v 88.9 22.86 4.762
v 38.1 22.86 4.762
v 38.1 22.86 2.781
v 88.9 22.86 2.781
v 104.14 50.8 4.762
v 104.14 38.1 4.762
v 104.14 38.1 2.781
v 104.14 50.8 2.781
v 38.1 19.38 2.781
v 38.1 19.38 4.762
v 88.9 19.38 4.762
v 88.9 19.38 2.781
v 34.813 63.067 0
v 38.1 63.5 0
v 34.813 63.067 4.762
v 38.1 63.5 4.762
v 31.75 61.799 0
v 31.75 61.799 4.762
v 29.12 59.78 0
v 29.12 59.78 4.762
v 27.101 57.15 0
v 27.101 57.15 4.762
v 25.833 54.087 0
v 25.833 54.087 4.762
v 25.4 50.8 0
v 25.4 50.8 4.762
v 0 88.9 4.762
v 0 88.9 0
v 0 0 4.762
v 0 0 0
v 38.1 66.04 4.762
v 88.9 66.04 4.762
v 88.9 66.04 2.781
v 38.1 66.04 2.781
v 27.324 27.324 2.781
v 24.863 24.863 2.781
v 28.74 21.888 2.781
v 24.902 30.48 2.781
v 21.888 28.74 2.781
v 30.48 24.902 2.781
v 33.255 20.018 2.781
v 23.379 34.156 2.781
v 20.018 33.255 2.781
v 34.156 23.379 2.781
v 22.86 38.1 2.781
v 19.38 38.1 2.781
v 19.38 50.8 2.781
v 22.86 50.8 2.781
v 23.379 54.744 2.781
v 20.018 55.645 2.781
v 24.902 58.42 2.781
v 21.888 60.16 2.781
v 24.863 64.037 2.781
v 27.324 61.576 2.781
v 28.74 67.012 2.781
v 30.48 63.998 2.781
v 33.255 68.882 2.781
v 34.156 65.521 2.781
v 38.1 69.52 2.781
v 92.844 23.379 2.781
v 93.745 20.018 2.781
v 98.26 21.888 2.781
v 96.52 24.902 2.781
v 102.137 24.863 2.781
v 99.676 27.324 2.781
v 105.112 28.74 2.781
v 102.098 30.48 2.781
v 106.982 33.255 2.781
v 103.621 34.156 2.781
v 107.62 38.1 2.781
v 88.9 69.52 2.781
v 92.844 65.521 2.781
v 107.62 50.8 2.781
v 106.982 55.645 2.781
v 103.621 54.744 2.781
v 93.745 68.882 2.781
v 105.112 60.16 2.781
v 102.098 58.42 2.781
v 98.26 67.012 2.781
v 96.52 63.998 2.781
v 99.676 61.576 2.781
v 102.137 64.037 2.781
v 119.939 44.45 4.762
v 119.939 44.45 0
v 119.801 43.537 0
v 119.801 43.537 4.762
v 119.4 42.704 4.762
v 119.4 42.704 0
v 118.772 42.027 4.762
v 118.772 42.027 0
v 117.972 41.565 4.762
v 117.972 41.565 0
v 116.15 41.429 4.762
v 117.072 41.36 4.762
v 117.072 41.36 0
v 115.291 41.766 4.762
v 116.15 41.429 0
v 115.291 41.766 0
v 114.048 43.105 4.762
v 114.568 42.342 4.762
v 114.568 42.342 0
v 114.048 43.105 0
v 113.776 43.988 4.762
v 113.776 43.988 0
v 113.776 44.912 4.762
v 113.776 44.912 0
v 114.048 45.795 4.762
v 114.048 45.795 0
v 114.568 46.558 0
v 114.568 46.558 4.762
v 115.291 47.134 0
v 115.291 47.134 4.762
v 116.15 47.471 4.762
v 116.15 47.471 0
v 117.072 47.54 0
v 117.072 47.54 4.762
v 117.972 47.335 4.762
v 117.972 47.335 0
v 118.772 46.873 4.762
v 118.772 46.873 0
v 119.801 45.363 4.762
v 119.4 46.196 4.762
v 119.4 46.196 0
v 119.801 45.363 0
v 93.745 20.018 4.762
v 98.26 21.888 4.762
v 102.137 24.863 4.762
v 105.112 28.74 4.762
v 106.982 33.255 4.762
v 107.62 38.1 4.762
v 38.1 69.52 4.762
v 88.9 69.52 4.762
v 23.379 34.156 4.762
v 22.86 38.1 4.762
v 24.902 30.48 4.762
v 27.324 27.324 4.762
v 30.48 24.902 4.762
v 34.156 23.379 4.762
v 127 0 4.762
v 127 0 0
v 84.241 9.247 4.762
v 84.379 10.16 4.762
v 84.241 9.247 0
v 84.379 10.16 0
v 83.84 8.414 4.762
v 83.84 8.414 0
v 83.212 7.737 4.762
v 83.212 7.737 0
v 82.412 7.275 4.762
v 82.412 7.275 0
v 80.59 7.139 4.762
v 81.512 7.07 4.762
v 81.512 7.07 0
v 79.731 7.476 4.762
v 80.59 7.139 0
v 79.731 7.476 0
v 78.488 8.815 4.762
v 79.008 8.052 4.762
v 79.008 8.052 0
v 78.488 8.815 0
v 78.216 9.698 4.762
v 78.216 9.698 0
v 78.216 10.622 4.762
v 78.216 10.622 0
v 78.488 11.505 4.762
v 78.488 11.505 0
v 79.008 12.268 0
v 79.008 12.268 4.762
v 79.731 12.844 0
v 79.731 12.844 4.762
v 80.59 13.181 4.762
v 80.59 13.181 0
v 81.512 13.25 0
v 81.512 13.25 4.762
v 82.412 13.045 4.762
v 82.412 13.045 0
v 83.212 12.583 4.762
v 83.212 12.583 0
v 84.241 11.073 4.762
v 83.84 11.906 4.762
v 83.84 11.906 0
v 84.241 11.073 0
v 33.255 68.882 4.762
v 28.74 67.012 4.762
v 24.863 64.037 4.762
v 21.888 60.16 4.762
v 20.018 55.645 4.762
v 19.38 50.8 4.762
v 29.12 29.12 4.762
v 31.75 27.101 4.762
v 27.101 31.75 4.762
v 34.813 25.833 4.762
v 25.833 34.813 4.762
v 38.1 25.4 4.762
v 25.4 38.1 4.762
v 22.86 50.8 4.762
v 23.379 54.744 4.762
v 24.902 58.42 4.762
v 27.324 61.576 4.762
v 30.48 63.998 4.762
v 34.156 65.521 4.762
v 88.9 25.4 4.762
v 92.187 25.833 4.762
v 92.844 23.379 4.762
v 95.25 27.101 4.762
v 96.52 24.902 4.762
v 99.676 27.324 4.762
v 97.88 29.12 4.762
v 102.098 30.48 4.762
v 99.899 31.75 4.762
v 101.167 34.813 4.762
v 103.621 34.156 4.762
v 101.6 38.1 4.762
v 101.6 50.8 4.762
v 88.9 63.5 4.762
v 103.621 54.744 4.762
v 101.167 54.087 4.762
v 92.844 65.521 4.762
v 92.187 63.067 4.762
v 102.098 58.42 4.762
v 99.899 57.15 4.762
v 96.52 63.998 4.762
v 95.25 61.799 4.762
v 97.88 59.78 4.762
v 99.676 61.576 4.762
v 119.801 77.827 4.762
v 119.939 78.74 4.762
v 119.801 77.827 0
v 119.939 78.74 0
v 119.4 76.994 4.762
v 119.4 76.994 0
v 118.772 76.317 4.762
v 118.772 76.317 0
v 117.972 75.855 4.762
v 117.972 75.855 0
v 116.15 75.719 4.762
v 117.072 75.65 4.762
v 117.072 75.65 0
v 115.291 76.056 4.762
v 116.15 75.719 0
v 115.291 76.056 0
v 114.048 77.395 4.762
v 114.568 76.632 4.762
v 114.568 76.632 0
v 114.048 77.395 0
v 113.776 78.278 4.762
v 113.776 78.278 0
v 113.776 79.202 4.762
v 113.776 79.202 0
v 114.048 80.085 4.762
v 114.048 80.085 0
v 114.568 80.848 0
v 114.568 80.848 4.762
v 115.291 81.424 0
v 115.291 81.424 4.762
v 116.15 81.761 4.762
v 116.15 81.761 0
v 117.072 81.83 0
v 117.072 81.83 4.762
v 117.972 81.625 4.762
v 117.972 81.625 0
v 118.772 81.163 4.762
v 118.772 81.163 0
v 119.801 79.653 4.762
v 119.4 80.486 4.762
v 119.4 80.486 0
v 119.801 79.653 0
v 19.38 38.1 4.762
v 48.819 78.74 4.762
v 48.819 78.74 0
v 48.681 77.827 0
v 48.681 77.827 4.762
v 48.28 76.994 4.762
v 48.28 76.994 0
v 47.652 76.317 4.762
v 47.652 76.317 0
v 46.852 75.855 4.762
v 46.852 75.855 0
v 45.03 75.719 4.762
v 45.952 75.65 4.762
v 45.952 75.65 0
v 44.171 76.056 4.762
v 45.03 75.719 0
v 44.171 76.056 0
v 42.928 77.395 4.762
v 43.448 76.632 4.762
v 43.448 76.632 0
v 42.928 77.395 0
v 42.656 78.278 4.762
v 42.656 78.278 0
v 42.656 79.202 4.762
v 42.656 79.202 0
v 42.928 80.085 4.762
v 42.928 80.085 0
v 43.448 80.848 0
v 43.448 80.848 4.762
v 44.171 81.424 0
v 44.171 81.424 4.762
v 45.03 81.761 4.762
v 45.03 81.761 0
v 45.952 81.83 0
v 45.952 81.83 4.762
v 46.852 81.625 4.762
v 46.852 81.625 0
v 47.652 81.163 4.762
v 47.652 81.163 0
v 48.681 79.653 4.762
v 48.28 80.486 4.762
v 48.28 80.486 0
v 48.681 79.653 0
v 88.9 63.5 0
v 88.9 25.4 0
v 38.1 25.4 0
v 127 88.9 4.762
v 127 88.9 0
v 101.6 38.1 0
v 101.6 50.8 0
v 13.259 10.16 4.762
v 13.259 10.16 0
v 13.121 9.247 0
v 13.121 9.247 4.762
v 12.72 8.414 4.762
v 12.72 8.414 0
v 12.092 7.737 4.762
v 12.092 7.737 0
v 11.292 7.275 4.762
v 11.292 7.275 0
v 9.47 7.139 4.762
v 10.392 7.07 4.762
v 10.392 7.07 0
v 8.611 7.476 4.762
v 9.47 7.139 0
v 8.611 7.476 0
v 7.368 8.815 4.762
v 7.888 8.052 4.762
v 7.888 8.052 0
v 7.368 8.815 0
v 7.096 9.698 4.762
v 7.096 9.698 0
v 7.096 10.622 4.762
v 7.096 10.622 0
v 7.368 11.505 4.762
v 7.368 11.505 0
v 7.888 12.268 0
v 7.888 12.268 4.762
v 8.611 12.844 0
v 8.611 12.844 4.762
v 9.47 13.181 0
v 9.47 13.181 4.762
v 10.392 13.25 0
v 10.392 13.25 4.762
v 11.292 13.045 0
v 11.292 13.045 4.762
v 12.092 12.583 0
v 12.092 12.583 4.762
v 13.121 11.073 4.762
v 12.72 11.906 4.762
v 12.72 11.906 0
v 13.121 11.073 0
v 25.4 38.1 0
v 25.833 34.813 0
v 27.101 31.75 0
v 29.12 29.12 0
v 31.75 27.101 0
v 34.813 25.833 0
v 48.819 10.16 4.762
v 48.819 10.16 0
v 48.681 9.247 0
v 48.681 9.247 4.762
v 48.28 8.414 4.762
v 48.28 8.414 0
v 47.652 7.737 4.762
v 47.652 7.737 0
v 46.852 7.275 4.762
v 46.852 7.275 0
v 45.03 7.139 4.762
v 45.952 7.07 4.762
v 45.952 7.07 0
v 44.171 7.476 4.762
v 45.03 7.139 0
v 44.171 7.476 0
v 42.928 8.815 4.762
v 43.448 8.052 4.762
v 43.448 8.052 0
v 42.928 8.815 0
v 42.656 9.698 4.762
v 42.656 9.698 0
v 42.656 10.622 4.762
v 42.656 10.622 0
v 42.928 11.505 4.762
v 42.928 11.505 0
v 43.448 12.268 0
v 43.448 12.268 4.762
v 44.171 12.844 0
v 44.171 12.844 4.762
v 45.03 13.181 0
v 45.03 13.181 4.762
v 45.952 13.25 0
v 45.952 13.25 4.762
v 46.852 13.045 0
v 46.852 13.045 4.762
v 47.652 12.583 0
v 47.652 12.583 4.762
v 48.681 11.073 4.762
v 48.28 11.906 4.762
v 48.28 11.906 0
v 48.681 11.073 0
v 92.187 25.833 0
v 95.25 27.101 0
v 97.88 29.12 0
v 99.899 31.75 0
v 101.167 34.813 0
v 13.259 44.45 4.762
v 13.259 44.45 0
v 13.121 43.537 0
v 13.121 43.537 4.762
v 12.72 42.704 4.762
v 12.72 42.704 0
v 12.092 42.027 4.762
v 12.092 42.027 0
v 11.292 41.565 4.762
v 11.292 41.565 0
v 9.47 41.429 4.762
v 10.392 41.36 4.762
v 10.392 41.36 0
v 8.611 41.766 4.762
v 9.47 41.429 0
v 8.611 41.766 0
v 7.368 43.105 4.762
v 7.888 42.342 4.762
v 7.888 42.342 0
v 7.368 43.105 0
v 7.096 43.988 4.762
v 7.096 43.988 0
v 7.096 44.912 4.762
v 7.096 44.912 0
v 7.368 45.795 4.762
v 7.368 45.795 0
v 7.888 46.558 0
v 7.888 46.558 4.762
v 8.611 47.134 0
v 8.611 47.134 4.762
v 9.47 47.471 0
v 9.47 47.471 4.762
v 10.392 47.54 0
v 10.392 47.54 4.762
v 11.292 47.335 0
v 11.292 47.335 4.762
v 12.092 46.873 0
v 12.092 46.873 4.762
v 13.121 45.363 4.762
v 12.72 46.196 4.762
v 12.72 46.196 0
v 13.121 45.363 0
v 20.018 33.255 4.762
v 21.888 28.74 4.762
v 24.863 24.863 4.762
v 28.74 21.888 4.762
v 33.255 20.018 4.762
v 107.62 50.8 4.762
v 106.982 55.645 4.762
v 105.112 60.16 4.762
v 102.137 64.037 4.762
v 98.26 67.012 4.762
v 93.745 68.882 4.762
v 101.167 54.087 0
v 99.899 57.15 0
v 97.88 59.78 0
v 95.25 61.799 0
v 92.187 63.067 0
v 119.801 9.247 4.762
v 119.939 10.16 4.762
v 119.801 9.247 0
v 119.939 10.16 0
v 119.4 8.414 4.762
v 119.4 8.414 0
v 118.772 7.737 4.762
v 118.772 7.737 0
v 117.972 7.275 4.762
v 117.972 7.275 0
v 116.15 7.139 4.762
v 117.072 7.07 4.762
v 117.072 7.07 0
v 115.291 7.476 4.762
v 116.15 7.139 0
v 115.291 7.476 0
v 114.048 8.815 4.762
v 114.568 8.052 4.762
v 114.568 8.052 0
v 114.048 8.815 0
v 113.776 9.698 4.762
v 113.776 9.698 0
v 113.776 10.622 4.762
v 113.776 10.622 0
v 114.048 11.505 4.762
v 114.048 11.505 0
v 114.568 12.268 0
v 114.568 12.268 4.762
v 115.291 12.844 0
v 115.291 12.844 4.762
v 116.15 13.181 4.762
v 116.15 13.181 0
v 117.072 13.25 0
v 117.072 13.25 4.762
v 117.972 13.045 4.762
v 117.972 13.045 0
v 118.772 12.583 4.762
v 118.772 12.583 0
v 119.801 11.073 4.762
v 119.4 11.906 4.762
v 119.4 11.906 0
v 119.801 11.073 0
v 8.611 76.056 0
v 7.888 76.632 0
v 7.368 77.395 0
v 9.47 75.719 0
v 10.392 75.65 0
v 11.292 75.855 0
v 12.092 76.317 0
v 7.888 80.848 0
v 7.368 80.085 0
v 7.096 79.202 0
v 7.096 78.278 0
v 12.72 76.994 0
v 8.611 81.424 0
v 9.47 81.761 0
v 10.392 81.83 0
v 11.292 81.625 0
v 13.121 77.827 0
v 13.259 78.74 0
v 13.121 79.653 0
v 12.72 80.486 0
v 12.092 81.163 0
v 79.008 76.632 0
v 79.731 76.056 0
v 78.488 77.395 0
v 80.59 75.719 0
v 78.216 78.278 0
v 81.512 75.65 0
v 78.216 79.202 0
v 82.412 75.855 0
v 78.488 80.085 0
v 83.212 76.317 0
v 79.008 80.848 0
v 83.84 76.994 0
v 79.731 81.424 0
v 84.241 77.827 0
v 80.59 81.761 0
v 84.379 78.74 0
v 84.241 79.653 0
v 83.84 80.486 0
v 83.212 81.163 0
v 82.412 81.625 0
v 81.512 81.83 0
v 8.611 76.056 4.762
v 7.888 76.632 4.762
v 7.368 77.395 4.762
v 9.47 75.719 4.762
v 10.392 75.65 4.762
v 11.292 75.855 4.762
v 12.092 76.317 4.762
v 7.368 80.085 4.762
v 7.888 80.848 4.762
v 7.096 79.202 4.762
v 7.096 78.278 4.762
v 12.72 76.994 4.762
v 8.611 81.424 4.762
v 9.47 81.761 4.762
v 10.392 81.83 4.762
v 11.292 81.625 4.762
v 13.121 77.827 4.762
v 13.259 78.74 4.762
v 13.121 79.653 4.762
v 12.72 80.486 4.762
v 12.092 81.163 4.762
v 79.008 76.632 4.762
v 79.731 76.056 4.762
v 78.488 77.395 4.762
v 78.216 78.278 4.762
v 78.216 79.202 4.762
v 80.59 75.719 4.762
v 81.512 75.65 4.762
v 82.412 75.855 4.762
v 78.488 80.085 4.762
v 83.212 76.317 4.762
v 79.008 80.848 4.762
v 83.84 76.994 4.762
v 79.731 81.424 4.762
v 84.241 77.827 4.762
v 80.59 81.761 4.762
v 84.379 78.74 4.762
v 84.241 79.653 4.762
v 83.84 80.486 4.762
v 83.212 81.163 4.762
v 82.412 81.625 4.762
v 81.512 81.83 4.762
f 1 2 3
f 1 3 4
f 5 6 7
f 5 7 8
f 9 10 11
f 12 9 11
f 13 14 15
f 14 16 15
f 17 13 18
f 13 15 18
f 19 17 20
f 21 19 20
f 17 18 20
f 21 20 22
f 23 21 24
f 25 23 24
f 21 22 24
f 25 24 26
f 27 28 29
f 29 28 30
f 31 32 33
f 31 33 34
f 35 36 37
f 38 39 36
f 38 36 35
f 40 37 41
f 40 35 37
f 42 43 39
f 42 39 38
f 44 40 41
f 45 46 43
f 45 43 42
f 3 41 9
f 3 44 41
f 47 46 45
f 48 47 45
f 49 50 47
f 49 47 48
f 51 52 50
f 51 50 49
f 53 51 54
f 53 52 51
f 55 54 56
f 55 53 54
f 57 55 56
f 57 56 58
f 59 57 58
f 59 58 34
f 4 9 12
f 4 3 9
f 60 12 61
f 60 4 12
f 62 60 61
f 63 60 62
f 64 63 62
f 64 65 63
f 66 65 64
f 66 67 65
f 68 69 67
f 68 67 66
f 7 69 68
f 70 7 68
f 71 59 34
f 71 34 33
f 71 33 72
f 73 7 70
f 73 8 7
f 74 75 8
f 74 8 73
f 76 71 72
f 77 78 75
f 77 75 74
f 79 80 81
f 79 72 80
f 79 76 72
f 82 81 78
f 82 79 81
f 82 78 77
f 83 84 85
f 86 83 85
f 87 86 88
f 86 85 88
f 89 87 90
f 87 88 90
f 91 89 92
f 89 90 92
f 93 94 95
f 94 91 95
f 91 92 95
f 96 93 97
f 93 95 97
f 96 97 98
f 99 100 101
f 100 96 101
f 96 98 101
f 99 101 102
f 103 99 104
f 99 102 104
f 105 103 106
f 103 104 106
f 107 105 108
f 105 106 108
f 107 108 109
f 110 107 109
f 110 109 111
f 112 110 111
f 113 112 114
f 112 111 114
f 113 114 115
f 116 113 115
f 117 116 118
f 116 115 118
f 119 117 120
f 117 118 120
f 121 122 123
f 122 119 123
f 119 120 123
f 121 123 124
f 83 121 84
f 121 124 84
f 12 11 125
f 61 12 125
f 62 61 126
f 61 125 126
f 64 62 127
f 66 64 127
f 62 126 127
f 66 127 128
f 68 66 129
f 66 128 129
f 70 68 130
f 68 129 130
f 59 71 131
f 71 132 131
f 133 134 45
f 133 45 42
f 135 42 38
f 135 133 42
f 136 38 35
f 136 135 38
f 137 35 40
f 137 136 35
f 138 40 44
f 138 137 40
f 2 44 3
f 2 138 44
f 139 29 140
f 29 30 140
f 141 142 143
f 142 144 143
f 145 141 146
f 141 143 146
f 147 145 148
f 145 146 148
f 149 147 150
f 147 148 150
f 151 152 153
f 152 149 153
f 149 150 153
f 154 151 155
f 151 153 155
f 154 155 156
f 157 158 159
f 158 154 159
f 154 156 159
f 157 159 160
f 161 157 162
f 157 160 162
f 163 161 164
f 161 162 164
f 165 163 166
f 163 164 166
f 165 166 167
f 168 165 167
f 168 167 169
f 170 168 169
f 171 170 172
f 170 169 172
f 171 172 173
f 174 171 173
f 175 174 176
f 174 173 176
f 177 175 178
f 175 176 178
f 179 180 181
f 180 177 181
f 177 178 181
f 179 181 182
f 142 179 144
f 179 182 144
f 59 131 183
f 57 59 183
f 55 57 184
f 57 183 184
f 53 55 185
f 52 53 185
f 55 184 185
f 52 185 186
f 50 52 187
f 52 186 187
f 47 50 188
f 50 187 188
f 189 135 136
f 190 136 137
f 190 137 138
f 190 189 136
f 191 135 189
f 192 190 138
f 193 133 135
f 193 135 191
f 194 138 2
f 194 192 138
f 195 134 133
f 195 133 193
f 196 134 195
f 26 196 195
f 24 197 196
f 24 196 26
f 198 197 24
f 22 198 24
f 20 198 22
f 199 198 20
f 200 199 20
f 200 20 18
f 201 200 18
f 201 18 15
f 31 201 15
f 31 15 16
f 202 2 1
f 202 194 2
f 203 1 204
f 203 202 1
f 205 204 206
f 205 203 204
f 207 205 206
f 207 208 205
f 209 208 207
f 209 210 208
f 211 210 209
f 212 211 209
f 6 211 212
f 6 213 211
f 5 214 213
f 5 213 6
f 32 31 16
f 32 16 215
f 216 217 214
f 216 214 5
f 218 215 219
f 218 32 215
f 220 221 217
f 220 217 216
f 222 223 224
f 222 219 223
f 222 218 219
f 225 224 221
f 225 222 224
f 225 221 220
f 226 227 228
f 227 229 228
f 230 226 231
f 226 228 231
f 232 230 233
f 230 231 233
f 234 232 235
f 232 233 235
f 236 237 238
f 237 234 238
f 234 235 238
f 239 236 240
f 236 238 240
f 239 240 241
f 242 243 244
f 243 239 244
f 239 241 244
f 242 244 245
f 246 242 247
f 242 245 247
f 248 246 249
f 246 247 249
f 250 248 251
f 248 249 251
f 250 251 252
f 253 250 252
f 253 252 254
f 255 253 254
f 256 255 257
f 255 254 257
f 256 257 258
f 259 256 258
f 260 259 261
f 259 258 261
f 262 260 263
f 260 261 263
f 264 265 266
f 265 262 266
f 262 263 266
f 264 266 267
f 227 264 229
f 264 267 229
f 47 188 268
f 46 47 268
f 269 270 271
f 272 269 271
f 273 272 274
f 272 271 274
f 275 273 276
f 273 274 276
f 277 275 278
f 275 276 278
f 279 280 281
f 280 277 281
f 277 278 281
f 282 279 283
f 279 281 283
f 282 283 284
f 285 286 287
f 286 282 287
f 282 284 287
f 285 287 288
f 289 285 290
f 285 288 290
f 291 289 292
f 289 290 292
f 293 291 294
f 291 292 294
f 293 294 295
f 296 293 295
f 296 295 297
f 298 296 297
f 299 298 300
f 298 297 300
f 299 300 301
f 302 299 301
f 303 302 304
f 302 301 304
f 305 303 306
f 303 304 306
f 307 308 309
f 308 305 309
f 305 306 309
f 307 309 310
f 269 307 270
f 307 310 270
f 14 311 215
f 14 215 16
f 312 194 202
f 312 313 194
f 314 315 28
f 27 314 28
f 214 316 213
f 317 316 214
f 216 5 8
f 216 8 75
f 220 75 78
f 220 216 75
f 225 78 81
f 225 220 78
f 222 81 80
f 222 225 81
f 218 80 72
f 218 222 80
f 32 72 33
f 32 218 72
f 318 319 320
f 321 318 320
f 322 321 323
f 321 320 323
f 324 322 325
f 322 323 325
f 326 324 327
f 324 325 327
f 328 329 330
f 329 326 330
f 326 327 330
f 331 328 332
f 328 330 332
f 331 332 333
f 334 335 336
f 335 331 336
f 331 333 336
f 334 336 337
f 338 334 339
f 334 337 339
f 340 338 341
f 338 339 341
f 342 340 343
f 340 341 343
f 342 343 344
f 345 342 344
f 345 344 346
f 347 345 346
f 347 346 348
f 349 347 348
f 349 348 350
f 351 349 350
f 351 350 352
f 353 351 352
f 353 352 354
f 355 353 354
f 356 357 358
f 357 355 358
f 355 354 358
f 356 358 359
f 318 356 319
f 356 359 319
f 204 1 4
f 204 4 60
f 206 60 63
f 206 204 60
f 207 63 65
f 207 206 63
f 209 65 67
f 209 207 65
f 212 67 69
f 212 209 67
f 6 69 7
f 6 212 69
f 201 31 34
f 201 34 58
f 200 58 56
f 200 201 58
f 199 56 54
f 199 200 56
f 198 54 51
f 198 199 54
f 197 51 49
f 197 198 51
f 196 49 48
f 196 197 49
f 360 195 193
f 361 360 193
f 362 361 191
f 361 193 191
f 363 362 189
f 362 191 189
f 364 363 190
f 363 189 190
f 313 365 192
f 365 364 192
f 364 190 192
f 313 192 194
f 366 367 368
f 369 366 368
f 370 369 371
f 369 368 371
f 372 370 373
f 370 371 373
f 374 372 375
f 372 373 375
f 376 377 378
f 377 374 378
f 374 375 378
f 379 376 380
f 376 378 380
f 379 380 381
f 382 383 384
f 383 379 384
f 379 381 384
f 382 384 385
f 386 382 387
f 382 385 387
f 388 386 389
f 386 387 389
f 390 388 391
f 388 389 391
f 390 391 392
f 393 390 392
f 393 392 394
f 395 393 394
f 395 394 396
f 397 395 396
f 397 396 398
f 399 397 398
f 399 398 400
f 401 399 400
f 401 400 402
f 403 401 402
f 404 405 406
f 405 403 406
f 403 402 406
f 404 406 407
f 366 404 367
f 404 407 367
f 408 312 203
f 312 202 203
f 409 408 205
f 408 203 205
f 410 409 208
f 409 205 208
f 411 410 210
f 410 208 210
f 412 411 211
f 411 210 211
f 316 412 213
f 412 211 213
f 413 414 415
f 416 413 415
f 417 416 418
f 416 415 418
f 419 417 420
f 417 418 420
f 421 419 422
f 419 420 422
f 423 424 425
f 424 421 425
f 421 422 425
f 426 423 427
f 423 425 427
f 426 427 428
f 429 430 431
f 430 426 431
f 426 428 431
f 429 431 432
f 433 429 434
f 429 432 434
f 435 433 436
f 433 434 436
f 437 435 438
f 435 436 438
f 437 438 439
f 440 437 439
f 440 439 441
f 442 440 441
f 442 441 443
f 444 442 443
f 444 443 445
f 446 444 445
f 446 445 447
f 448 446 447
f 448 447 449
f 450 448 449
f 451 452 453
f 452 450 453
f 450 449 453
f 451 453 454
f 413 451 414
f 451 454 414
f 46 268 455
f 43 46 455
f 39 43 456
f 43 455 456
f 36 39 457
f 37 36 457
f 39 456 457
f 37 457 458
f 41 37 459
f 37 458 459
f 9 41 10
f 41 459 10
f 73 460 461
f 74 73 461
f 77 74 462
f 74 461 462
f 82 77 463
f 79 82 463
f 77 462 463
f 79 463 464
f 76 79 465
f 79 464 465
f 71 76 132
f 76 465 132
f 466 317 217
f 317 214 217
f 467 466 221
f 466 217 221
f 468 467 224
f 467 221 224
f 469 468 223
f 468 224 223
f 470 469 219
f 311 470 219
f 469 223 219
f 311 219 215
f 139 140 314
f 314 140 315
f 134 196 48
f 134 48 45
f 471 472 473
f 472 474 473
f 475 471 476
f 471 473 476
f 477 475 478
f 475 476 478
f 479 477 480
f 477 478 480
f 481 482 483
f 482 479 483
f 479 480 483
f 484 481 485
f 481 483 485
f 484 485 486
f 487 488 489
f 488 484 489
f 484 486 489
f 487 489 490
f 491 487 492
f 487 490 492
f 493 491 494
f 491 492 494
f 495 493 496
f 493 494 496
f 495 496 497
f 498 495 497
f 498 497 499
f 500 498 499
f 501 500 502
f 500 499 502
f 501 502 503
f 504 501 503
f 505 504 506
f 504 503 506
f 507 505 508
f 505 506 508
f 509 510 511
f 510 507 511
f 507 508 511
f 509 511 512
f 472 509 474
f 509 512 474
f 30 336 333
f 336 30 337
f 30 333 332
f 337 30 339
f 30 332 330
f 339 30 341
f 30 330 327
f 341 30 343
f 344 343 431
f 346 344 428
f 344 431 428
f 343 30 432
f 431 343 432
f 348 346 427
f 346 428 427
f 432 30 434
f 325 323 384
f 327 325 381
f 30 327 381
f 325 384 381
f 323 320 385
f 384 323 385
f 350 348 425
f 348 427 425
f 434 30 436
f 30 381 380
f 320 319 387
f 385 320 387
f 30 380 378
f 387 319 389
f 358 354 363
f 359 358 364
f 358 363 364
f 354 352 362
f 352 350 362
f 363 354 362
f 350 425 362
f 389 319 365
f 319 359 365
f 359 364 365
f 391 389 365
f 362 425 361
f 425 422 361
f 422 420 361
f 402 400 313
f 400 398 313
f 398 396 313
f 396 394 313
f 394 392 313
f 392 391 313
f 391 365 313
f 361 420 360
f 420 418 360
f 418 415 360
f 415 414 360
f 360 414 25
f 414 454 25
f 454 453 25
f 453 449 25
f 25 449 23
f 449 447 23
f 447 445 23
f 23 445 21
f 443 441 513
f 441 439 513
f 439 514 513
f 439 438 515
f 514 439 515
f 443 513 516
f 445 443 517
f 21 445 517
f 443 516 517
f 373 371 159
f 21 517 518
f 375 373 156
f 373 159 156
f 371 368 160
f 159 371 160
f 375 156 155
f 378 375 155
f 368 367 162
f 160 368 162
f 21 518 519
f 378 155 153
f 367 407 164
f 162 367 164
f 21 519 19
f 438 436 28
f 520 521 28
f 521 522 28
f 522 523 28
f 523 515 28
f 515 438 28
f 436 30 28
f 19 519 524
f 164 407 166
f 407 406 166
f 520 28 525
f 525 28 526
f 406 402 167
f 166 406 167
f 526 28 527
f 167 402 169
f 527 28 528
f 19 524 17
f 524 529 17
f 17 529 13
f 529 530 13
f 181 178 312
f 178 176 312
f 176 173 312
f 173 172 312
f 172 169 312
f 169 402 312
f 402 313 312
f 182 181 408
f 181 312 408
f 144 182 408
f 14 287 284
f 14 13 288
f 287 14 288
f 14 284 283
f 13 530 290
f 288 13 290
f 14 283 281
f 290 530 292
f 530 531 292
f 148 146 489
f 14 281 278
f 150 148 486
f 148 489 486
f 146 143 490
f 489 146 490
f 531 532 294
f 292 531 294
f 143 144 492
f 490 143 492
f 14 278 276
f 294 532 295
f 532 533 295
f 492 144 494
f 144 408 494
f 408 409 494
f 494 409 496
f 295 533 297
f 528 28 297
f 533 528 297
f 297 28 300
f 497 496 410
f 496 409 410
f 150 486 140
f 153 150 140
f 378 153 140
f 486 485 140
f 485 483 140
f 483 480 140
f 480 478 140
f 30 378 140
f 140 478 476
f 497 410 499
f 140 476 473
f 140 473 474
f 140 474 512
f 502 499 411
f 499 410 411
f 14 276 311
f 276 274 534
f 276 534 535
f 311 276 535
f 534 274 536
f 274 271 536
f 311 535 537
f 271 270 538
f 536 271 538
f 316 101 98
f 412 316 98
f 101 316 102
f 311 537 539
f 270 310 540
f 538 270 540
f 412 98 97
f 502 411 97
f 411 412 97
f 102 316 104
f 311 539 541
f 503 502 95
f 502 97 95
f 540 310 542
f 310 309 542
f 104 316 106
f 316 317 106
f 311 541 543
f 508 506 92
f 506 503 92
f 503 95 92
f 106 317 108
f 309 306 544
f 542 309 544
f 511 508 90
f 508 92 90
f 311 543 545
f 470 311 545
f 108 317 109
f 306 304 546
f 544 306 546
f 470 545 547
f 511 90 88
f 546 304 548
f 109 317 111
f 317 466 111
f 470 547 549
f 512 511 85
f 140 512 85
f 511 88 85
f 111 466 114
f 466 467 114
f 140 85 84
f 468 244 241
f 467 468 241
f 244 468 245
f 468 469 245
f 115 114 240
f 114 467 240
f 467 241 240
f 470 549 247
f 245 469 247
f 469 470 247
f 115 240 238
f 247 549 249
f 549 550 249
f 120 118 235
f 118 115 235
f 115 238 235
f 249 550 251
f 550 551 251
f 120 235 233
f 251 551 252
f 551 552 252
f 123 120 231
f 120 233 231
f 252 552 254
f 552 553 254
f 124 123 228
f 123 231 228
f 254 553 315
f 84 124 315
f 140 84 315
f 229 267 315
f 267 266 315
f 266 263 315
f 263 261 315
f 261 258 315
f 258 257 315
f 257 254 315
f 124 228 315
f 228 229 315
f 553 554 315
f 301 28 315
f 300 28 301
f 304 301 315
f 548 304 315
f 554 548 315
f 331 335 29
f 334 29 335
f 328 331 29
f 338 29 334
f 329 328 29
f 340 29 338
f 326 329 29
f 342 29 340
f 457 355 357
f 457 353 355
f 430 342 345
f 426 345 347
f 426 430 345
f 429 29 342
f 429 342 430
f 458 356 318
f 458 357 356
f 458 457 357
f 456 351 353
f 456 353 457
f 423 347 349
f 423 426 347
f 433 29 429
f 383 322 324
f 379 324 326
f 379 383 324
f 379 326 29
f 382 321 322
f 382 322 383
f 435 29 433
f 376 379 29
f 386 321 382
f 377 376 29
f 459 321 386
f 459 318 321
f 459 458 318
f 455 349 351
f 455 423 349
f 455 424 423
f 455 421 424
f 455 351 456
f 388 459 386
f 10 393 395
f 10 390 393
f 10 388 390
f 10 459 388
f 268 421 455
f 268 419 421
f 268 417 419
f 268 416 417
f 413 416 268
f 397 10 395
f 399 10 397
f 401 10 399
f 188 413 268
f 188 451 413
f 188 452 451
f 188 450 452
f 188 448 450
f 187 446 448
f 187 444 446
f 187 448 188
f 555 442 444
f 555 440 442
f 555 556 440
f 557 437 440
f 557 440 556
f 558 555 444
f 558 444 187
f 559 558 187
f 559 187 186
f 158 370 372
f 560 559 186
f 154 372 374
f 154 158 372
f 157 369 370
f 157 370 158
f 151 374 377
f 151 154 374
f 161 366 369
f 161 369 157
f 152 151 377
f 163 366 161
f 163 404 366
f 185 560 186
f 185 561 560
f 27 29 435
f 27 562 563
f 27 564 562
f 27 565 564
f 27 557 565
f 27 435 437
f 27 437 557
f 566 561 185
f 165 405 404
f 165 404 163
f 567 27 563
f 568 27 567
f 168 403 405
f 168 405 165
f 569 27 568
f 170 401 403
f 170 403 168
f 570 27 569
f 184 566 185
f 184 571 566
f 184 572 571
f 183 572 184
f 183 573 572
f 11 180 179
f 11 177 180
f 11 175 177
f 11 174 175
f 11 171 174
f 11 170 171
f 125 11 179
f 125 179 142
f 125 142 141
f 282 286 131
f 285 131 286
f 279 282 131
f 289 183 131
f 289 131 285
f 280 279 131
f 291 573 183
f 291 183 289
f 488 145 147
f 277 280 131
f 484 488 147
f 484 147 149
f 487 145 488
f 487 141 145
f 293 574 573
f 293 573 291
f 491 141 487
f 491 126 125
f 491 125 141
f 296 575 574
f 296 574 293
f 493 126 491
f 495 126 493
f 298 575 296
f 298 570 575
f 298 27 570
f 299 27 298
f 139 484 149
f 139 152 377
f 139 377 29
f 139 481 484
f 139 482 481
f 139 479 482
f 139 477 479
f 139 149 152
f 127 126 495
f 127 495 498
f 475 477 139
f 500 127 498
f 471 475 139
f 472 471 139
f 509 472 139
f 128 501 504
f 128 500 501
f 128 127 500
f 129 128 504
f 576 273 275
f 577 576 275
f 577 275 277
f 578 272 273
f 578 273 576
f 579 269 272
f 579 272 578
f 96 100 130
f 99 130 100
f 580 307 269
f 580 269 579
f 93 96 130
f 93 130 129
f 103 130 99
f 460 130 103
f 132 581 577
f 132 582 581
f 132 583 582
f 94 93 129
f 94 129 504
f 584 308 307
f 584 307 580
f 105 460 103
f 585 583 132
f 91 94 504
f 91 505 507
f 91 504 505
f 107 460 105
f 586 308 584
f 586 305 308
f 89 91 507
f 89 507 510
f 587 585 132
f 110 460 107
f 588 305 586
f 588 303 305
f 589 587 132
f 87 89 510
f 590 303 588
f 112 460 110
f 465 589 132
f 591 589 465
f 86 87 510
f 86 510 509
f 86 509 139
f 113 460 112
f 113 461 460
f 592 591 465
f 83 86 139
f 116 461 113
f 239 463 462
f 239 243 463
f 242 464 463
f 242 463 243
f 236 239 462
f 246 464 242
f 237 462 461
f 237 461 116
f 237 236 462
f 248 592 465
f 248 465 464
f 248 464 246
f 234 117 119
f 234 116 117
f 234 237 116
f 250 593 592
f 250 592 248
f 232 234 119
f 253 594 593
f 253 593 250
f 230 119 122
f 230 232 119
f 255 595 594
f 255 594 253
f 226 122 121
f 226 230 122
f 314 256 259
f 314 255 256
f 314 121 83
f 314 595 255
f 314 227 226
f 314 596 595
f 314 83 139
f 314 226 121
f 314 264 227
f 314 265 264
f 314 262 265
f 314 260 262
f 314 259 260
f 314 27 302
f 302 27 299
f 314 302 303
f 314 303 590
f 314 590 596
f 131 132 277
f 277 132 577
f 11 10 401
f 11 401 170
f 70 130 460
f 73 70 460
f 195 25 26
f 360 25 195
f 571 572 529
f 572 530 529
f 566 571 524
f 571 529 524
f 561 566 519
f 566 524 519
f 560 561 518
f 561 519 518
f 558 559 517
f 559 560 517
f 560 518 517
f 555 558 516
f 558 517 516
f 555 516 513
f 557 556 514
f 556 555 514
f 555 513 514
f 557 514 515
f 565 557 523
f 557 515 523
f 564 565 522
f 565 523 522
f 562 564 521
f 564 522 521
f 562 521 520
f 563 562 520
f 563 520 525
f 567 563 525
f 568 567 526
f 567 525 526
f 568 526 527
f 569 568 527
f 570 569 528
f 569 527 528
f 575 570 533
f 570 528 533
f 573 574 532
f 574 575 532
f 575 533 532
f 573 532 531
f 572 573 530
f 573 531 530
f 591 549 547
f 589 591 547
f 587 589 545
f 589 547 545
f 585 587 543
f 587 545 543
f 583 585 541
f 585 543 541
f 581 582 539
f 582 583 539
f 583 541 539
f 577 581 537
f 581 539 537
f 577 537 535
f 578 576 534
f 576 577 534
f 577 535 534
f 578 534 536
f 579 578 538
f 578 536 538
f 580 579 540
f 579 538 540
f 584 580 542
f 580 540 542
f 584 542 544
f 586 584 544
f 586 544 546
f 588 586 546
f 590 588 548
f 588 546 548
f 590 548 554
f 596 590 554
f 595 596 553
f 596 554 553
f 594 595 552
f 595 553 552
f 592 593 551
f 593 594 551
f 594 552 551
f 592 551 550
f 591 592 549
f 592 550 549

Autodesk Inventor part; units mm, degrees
ref_plane "YZ Plane" through (0, 0, 0) normal (1, 0, 0) x (0, 1, 0)
ref_plane "XZ Plane" through (0, 0, 0) normal (0, 1, 0) x (-1, 0, 0)
ref_plane "XY Plane" through (0, 0, 0) normal (0, 0, 1) x (1, 0, 0)
sketch "Sketch1" plane through (0, 0, 0) normal (0, 0, 1) x (1, 0, 0)
  line L0 (0, 0) -> (127, 0)
  line L1 (127, 0) -> (127, 88.9)
  line L2 (127, 88.9) -> (0, 88.9)
  line L3 (0, 88.9) -> (0, 0)
  circle A0 centre (10.16, 78.74) radius 3.0988
  circle A1 centre (10.16, 44.45) radius 3.0988
  circle A2 centre (10.16, 10.16) radius 3.0988
  circle A3 centre (45.72, 10.16) radius 3.0988
  circle A4 centre (116.84, 10.16) radius 3.0988
  circle A5 centre (116.84, 44.45) radius 3.0988
  circle A6 centre (116.84, 78.74) radius 3.0988
  circle A7 centre (45.72, 78.74) radius 3.0988
  line L4 (25.4, 25.4) -> (101.6, 25.4)
  line L5 (101.6, 25.4) -> (101.6, 63.5)
  line L6 (101.6, 63.5) -> (25.4, 63.5)
  line L7 (25.4, 63.5) -> (25.4, 25.4)
  line L8 (25.4, 25.4) -> (101.6, 63.5) construction
  line L9 (101.6, 25.4) -> (25.4, 63.5) construction
  circle A8 centre (81.28, 10.16) radius 3.0988
  circle A9 centre (81.28, 78.74) radius 3.0988
  point P0 (63.5, 44.45)
  dimension "d0" = 127
  dimension "d1" = 88.9
  dimension "d3" = 6.1976
  dimension "d4" = 10.16
  dimension "d5" = 10.16
  dimension "d6" = 10.16
  dimension "d7" = 10.16
  dimension "d8" = 44.45
  dimension "d10" = 10.16
  dimension "d11" = 10.16
  dimension "d12" = 10.16
  dimension "d13" = 10.16
  dimension "d14" = 44.45
  dimension "d15" = 10.16
  dimension "d16" = 10.16
  dimension "d17" = 10.16
  dimension "d18" = 10.16
  dimension "d31" = 76.2
  dimension "d32" = 38.1
  dimension "d33" = 44.45
  dimension "d34" = 63.5
  dimension "d42" = 35.56
  dimension "d43" = 35.56
  dimension "d44" = 35.56
  dimension "d46" = 35.56
  dimension "d47" = 35.56
  dimension "d49" = 35.56
extrude "Extrusion1" add sketch "Sketch1" along normal blind 4.7625
thread "Thread1" size "M6x1" class "6H" standard "ANSI Metric M Profile" full length
thread "Thread2" size "M6x1" class "6H" standard "ANSI Metric M Profile" full length
thread "Thread3" size "M6x1" class "6H" standard "ANSI Metric M Profile" full length
thread "Thread4" size "M6x1" class "6H" standard "ANSI Metric M Profile" full length
thread "Thread5" size "M6x1" class "6H" standard "ANSI Metric M Profile" full length
thread "Thread6" size "M6x1" class "6H" standard "ANSI Metric M Profile" full length
thread "Thread7" size "M6x1" class "6H" standard "ANSI Metric M Profile" full length
thread "Thread8" size "M6x1" class "6H" standard "ANSI Metric M Profile" full length
thread "Thread9" size "M6x1" class "6H" standard "ANSI Metric M Profile" full length
fillet "Fillet3" radius 12.7 4 edges at (101.6, 63.5, 2.3813) (101.6, 25.4, 2.3813) (25.4, 63.5, 2.3813) (25.4, 25.4, 2.3813)
sketch "Sketch4" plane through (0, 0, 4.7625) normal (0, 0, 1) x (1, 0, 0)
  arc A0 (38.1, 63.5) -> (25.4, 50.8) centre (38.1, 50.8) ccw projected
  arc A1 (38.1, 63.5) -> (25.4, 50.8) centre (38.1, 50.8) ccw
  arc A2 (101.6, 50.8) -> (88.9, 63.5) centre (88.9, 50.8) ccw projected
  arc A3 (101.6, 50.8) -> (88.9, 63.5) centre (88.9, 50.8) ccw
  arc A4 (88.9, 25.4) -> (101.6, 38.1) centre (88.9, 38.1) ccw projected
  arc A5 (88.9, 25.4) -> (101.6, 38.1) centre (88.9, 38.1) ccw
  arc A6 (25.4, 38.1) -> (38.1, 25.4) centre (38.1, 38.1) ccw projected
  arc A7 (25.4, 38.1) -> (38.1, 25.4) centre (38.1, 38.1) ccw
  line L0 (38.1, 25.4) -> (88.9, 25.4) projected
  line L1 (38.1, 25.4) -> (88.9, 25.4)
  line L2 (101.6, 38.1) -> (101.6, 50.8) projected
  line L3 (101.6, 38.1) -> (101.6, 50.8)
  line L4 (88.9, 63.5) -> (38.1, 63.5) projected
  line L5 (88.9, 63.5) -> (38.1, 63.5)
  line L6 (25.4, 38.1) -> (25.4, 50.8) projected
  line L7 (25.4, 50.8) -> (25.4, 38.1)
  arc A8 (38.1, 66.04) -> (22.86, 50.8) centre (38.1, 50.8) ccw
  line L8 (22.86, 50.8) -> (22.86, 38.1)
  arc A9 (22.86, 38.1) -> (38.1, 22.86) centre (38.1, 38.1) ccw
  line L9 (38.1, 22.86) -> (88.9, 22.86)
  arc A10 (88.9, 22.86) -> (104.14, 38.1) centre (88.9, 38.1) ccw
  line L10 (104.14, 38.1) -> (104.14, 50.8)
  arc A11 (104.14, 50.8) -> (88.9, 66.04) centre (88.9, 50.8) ccw
  line L11 (88.9, 66.04) -> (38.1, 66.04)
  arc A12 (38.1, 69.5198) -> (19.3802, 50.8) centre (38.1, 50.8) ccw
  line L12 (19.3802, 50.8) -> (19.3802, 38.1)
  arc A13 (19.3802, 38.1) -> (38.1, 19.3802) centre (38.1, 38.1) ccw
  line L13 (38.1, 19.3802) -> (88.9, 19.3802)
  arc A14 (88.9, 19.3802) -> (107.6198, 38.1) centre (88.9, 38.1) ccw
  line L14 (107.6198, 38.1) -> (107.6198, 50.8)
  arc A15 (107.6198, 50.8) -> (88.9, 69.5198) centre (88.9, 50.8) ccw
  line L15 (88.9, 69.5198) -> (38.1, 69.5198)
  point P0 (0, 0)
  dimension "d69" = 2.54
  dimension "d70" = 3.4798
extrude "Extrusion4" cut sketch "Sketch4" against normal blind 1.9812 contours L15 A15 L14 A14 L13 A13 L12 A12
thread "Thread10" size "M6x1" class "6H" standard "ANSI Metric M Profile" full length
equation "\"d6\" = d5"
equation "\"d7\" = d4"
equation "\"d8\" = 0.5 * d1"
equation "\"d10\" = d4"
equation "\"d11\" = d5"
equation "\"d12\" = d4"
equation "\"d13\" = d5"
equation "\"d14\" = 0.5 * d1"
equation "\"d15\" = d13"
equation "\"d16\" = d12"
equation "\"d17\" = d13"
equation "\"d18\" = d16"
equation "\"d33\" = 0.5 * d1"
equation "\"d34\" = 0.5 * d0"
equation "\"d43\" = d42"
equation "\"d44\" = d43"
equation "\"d46\" = d42"
equation "\"d47\" = d46"
equation "\"d49\" = d46"
properties part number "Front"
